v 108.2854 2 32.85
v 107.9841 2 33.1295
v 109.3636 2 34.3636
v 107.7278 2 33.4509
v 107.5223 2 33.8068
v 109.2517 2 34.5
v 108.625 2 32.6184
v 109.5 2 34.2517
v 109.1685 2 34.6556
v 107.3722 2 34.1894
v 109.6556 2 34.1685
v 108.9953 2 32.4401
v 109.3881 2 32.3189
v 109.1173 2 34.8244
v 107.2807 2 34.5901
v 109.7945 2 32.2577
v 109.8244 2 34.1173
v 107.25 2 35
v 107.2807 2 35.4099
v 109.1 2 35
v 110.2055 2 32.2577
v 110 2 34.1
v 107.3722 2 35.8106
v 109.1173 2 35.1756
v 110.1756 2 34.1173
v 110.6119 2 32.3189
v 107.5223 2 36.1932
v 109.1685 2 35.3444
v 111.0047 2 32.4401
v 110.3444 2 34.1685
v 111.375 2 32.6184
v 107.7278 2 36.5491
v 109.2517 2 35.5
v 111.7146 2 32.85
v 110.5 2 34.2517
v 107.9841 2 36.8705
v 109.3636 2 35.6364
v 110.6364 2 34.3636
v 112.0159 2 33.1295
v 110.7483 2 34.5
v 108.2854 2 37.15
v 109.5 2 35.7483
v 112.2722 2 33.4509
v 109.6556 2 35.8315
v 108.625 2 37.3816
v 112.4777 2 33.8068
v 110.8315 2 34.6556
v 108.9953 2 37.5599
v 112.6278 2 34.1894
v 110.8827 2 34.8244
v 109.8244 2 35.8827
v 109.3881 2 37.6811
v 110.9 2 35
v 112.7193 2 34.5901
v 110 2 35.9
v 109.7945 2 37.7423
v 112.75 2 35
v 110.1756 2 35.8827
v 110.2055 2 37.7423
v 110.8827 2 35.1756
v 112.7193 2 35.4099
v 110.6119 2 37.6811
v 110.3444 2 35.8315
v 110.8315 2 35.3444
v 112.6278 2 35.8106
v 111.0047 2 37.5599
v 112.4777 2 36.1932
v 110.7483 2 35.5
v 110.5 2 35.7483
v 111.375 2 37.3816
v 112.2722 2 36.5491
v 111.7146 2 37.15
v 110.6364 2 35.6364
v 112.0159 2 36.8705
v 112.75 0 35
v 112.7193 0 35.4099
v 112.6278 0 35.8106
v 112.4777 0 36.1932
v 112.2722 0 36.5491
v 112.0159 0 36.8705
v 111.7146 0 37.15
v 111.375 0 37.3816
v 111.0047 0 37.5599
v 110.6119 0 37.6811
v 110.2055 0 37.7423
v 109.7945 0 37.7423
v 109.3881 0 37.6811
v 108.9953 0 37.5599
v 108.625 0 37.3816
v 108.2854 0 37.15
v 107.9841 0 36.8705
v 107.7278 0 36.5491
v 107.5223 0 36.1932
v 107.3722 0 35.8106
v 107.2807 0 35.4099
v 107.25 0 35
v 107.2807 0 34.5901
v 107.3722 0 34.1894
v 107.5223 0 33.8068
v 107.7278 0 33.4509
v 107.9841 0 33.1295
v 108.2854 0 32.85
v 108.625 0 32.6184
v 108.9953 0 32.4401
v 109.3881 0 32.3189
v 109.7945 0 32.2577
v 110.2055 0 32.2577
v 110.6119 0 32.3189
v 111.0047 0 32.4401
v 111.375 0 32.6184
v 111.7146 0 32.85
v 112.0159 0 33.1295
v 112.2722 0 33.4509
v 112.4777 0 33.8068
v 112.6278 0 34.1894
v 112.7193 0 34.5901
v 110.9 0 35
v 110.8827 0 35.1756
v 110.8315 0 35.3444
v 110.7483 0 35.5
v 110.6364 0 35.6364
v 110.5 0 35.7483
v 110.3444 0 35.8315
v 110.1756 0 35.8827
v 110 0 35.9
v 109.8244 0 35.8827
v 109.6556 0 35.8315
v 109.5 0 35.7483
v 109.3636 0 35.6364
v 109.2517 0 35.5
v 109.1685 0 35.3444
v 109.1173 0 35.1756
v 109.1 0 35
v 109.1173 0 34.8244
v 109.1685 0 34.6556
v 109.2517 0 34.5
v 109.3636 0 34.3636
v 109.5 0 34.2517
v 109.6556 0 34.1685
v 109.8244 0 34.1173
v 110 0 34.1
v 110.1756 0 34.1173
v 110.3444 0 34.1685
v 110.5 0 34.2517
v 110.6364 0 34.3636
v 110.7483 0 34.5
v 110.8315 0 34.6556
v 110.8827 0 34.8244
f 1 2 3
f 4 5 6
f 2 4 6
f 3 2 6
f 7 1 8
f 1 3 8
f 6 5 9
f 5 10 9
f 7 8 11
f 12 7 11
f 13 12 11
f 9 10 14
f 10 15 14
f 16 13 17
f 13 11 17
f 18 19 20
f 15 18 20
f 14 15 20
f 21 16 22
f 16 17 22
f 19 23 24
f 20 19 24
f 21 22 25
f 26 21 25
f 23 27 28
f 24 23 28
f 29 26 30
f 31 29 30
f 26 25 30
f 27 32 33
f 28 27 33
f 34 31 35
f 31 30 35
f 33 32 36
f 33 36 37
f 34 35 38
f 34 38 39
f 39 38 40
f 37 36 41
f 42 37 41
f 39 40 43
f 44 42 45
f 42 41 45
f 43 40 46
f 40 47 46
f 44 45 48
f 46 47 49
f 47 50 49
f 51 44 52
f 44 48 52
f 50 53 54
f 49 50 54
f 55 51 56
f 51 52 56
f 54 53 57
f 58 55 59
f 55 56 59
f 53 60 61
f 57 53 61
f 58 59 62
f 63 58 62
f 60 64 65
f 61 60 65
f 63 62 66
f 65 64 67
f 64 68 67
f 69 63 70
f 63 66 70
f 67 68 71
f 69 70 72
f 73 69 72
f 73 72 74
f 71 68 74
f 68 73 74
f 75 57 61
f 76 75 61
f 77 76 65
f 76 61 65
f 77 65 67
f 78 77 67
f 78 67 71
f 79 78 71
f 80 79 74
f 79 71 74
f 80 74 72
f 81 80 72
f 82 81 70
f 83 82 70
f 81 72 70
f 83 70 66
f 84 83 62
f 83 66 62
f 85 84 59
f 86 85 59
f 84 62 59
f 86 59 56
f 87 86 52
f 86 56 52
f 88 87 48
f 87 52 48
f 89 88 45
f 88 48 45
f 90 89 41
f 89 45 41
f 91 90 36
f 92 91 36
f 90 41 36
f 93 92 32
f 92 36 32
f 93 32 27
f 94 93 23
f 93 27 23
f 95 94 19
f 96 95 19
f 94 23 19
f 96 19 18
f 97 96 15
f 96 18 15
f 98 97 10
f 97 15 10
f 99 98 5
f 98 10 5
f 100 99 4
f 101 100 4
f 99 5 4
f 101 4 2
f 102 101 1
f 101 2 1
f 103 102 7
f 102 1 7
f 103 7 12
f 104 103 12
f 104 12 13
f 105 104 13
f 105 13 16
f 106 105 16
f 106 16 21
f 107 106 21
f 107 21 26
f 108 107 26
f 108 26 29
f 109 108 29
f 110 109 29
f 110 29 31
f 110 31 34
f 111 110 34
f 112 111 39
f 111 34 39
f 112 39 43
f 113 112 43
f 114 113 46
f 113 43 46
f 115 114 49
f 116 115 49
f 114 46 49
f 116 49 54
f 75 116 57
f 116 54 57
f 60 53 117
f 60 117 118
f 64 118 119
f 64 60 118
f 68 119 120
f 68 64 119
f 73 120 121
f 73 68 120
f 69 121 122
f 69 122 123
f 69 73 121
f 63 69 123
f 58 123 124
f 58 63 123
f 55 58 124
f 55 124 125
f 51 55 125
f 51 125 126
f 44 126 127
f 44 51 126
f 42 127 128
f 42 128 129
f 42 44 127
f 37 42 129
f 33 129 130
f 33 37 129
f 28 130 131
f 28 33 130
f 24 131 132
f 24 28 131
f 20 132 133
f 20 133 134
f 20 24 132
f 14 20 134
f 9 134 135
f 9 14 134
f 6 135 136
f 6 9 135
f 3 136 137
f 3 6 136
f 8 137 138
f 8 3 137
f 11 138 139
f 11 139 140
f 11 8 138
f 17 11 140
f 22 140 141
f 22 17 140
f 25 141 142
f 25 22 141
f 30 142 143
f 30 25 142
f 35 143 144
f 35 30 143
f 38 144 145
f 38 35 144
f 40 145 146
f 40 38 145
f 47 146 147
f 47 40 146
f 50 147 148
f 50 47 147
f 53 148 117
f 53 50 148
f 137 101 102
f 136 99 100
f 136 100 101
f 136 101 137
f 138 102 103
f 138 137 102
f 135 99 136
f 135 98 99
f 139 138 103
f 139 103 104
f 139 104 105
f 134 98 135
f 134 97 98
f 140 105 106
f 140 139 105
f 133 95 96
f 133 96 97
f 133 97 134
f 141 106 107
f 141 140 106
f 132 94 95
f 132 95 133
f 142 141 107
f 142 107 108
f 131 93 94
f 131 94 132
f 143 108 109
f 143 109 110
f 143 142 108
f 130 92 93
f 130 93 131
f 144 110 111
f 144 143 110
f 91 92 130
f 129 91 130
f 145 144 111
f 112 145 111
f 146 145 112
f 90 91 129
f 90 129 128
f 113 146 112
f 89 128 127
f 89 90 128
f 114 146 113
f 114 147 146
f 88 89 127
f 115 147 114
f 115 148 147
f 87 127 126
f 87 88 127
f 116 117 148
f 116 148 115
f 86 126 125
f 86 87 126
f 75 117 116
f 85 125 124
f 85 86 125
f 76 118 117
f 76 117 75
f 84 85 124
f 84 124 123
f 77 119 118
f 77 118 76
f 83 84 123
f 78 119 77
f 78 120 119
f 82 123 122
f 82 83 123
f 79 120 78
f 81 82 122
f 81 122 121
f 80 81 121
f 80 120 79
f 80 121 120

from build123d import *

# Parameters (mm, degrees)
CYLINDER015_R            = 0.9
CYLINDER015_DEPTH        = 2
CYLINDER014_R            = 2.75
CYLINDER014_DEPTH        = 2
CLONE016_PLACEMENT_ANGLE = 90


with BuildPart() as faceanchorscrewhole:
    # Cylinder015 → Cylinder015 (new body)
    with BuildSketch(Plane.XY):
        Circle(CYLINDER015_R)
    extrude(amount=CYLINDER015_DEPTH)


with BuildPart() as faceanchor002:
    # Cylinder014 → Cylinder014 (new body)
    with BuildSketch(Plane.XY):
        Circle(CYLINDER014_R)
    extrude(amount=CYLINDER014_DEPTH)

    # Cut015: cut FaceAnchorScrewHole
    add(faceanchorscrewhole.part, mode=Mode.SUBTRACT)


with BuildPart() as faceanchor002_1:
    # Clone016 placement: moved
    add(faceanchor002.part.moved(Location((110, 2, 35))).rotate(Axis((110, 2, 35), (1, 0, 0)), CLONE016_PLACEMENT_ANGLE))


solid = faceanchor002_1.part
